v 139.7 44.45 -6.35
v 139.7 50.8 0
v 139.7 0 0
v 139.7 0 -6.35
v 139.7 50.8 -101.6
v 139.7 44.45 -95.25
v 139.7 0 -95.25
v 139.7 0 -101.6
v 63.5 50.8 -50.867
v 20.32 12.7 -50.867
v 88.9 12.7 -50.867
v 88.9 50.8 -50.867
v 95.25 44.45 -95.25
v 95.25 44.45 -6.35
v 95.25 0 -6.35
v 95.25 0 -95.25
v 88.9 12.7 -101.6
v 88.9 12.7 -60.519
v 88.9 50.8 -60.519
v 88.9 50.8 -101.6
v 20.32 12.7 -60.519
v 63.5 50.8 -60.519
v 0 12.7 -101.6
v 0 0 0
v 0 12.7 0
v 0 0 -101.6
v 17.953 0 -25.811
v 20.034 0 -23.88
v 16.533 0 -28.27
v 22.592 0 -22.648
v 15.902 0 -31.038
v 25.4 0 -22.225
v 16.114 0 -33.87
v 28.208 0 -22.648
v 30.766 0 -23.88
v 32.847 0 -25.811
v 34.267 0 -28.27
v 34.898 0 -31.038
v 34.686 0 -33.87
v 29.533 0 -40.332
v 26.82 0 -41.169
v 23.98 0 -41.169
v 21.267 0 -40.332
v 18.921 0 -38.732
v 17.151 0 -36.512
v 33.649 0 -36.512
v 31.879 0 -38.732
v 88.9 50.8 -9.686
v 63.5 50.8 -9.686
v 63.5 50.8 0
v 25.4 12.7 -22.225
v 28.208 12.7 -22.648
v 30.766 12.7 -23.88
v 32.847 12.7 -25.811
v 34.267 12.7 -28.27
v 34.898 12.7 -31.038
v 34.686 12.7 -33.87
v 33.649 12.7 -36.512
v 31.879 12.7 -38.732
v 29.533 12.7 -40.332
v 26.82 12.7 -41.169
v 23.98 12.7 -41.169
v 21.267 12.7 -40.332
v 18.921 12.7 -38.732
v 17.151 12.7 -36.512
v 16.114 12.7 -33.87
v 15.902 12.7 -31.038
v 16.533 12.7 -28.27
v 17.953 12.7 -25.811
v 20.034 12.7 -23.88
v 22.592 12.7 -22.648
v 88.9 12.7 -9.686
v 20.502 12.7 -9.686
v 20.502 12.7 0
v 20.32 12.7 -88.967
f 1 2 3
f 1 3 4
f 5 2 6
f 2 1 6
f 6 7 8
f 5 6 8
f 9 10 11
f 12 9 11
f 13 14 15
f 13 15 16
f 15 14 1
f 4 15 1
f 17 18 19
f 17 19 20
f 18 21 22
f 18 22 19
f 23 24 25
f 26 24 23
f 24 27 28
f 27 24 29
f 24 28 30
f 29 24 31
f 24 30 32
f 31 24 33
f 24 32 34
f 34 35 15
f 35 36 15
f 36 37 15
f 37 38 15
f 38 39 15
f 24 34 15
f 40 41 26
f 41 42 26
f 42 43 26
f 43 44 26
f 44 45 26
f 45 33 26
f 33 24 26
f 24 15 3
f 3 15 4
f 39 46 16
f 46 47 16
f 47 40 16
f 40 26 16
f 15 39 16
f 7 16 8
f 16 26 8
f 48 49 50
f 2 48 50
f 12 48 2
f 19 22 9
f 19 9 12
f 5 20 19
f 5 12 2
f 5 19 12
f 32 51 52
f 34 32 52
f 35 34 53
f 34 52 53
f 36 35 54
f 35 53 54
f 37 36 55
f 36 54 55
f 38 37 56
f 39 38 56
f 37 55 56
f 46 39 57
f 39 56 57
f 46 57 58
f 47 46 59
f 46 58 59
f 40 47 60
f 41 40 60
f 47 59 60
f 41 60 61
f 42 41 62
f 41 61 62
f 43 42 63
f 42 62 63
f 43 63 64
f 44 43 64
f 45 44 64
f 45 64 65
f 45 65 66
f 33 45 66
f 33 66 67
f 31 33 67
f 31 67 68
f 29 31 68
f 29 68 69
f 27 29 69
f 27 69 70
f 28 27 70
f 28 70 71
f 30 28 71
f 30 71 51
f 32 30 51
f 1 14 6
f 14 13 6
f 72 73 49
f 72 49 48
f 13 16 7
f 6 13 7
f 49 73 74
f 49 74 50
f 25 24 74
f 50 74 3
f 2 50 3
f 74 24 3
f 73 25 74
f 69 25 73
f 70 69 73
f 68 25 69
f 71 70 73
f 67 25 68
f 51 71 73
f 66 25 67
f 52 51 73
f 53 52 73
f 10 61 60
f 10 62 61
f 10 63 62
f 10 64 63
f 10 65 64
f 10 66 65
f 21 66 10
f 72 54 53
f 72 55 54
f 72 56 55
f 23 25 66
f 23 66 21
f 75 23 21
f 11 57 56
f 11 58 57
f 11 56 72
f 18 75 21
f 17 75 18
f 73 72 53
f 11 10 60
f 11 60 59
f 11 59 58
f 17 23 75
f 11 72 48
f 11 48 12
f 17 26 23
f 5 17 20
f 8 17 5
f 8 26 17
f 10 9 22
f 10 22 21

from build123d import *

# Parameters (mm, degrees)
SKETCH1_W            = 139.7
SKETCH1_H            = 101.6
BOSS_EXTRUDE1_DEPTH  = 12.7
SKETCH2_W            = 44.45
SKETCH2_H            = 6.35
BOSS_EXTRUDE2_DEPTH  = 31.75
SKETCH3_W            = 44.45
SKETCH3_H            = 6.35
BOSS_EXTRUDE3_DEPTH  = 31.75
SKETCH4_W            = 6.35
SKETCH4_H            = 101.6
BOSS_EXTRUDE4_DEPTH  = 31.75
SKETCH5_W            = 50.8
SKETCH5_H            = 101.6
BOSS_EXTRUDE5_DEPTH  = 6.35
SKETCH7_W            = 44.45
SKETCH7_H            = 88.9
BOSS_EXTRUDE7_DEPTH  = 12.7
SKETCH9_W            = 44.45
SKETCH9_H            = 88.9
CUT_EXTRUDE1_DEPTH   = 12.7
SKETCH10_W           = 25.218134922
SKETCH10_H           = 9.68567434
BOSS_EXTRUDE8_DEPTH  = 38.1
SKETCH11_W           = 25.4
SKETCH11_H           = 9.652
BOSS_EXTRUDE9_DEPTH  = 38.1
SKETCH12_R           = 9.525
CUT_EXTRUDE2_DEPTH   = 38.1
SKETCH13_W           = 43.179728204
SKETCH13_H           = 9.652
BOSS_EXTRUDE10_DEPTH = 38.1
SKETCH14_W           = 43.18
SKETCH14_H           = 9.68567434
BOSS_EXTRUDE11_DEPTH = 38.1
CUT_EXTRUDE8_START   = -9.68567434
CUT_EXTRUDE8_DEPTH   = 9.68567434
CUT_EXTRUDE10_DEPTH  = 38.1


# Read off the part's stored shape, not the designer's step: Cut-Extrude8
with BuildPart() as part:
    # Sketch1 → Boss-Extrude1 (new body)
    with BuildSketch(Plane(origin=(0, 0, 0), x_dir=(1, 0, 0), z_dir=(0, 1, 0))):
        with Locations((69.85, 50.8)):
            Rectangle(SKETCH1_W, SKETCH1_H)
    extrude(amount=BOSS_EXTRUDE1_DEPTH)

    # Sketch2 → Boss-Extrude2 (add)
    with BuildSketch(Plane(origin=(0, 12.7, 0), x_dir=(1, 0, 0), z_dir=(0, 1, 0))):
        with Locations((117.475, 3.175)):
            Rectangle(SKETCH2_W, SKETCH2_H)
    extrude(amount=BOSS_EXTRUDE2_DEPTH)

    # Sketch3 → Boss-Extrude3 (add)
    with BuildSketch(Plane(origin=(0, 12.7, 0), x_dir=(1, 0, 0), z_dir=(0, 1, 0))):
        with Locations((117.475, 98.425)):
            Rectangle(SKETCH3_W, SKETCH3_H)
    extrude(amount=BOSS_EXTRUDE3_DEPTH)

    # Sketch4 → Boss-Extrude4 (add)
    with BuildSketch(Plane(origin=(0, 12.7, 0), x_dir=(1, 0, 0), z_dir=(0, 1, 0))):
        with Locations((92.075, 50.8)):
            Rectangle(SKETCH4_W, SKETCH4_H)
    extrude(amount=BOSS_EXTRUDE4_DEPTH)

    # Sketch5 → Boss-Extrude5 (add)
    with BuildSketch(Plane(origin=(0, 44.45, 0), x_dir=(1, 0, 0), z_dir=(0, 1, 0))):
        with Locations((114.3, 50.8)):
            Rectangle(SKETCH5_W, SKETCH5_H)
    extrude(amount=BOSS_EXTRUDE5_DEPTH)

    # Sketch7 → Boss-Extrude7 (add)
    with BuildSketch(Plane(origin=(0, 12.7, 0), x_dir=(1, 0, 0), z_dir=(0, 1, 0))):
        with Locations((117.475, 50.8)):
            Rectangle(SKETCH7_W, SKETCH7_H)
    extrude(amount=-BOSS_EXTRUDE7_DEPTH)

    # Sketch9 → Cut-Extrude1 (cut)
    with BuildSketch(Plane(origin=(0, 12.7, 0), x_dir=(1, 0, 0), z_dir=(0, 1, 0))):
        with Locations((117.475, 50.8)):
            Rectangle(SKETCH9_W, SKETCH9_H)
    extrude(amount=-CUT_EXTRUDE1_DEPTH, mode=Mode.SUBTRACT)

    # Sketch10 → Boss-Extrude8 (add)
    with BuildSketch(Plane(origin=(0, 12.7, 0), x_dir=(1, 0, 0), z_dir=(0, 1, 0))):
        with Locations((76.290932539, 4.84283717)):
            Rectangle(SKETCH10_W, SKETCH10_H)
    extrude(amount=BOSS_EXTRUDE8_DEPTH)

    # Sketch11 → Boss-Extrude9 (add)
    with BuildSketch(Plane(origin=(0, 12.7, 0), x_dir=(1, 0, 0), z_dir=(0, 1, 0))):
        with Locations((76.2, 55.693142425)):
            Rectangle(SKETCH11_W, SKETCH11_H)
    extrude(amount=BOSS_EXTRUDE9_DEPTH)

    # Sketch12 → Cut-Extrude2 (cut)
    with BuildSketch(Plane(origin=(0, 12.7, 0), x_dir=(1, 0, 0), z_dir=(0, 1, 0))):
        with Locations(Location((25.4, 31.75, 0), (0, 0, 270))):
            Circle(SKETCH12_R)
    extrude(amount=-CUT_EXTRUDE2_DEPTH, mode=Mode.SUBTRACT)

    # Sketch13 → Boss-Extrude10 (add)
    with BuildSketch(Plane(origin=(0, 12.7, 0), x_dir=(1, 0, 0), z_dir=(0, 1, 0))):
        with Locations((41.910135898, 55.693142425)):
            Rectangle(SKETCH13_W, SKETCH13_H)
    extrude(amount=BOSS_EXTRUDE10_DEPTH)

    # Sketch14 → Boss-Extrude11 (add)
    with BuildSketch(Plane(origin=(0, 12.7, 0), x_dir=(1, 0, 0), z_dir=(0, 1, 0))):
        with Locations((42.091865078, 4.84283717)):
            Rectangle(SKETCH14_W, SKETCH14_H)
    extrude(amount=BOSS_EXTRUDE11_DEPTH)

    # Cut-Extrude8 outline → Cut-Extrude8 (cut)
    with BuildSketch(Plane.XY.offset(CUT_EXTRUDE8_START)):
        Polygon((20.501865078, 50.8), (20.501865078, 12.7), (63.500271796, 50.8), align=None)
    extrude(amount=CUT_EXTRUDE8_DEPTH, mode=Mode.SUBTRACT)

    # Sketch16 → Cut-Extrude10 (cut)
    with BuildSketch(Plane.XY.offset(-50.867142425)):
        Polygon((20.320271796, 12.7), (20.320271796, 50.8), (63.500271796, 50.8), align=None)
    extrude(amount=-CUT_EXTRUDE10_DEPTH, mode=Mode.SUBTRACT)


solid = part.part
